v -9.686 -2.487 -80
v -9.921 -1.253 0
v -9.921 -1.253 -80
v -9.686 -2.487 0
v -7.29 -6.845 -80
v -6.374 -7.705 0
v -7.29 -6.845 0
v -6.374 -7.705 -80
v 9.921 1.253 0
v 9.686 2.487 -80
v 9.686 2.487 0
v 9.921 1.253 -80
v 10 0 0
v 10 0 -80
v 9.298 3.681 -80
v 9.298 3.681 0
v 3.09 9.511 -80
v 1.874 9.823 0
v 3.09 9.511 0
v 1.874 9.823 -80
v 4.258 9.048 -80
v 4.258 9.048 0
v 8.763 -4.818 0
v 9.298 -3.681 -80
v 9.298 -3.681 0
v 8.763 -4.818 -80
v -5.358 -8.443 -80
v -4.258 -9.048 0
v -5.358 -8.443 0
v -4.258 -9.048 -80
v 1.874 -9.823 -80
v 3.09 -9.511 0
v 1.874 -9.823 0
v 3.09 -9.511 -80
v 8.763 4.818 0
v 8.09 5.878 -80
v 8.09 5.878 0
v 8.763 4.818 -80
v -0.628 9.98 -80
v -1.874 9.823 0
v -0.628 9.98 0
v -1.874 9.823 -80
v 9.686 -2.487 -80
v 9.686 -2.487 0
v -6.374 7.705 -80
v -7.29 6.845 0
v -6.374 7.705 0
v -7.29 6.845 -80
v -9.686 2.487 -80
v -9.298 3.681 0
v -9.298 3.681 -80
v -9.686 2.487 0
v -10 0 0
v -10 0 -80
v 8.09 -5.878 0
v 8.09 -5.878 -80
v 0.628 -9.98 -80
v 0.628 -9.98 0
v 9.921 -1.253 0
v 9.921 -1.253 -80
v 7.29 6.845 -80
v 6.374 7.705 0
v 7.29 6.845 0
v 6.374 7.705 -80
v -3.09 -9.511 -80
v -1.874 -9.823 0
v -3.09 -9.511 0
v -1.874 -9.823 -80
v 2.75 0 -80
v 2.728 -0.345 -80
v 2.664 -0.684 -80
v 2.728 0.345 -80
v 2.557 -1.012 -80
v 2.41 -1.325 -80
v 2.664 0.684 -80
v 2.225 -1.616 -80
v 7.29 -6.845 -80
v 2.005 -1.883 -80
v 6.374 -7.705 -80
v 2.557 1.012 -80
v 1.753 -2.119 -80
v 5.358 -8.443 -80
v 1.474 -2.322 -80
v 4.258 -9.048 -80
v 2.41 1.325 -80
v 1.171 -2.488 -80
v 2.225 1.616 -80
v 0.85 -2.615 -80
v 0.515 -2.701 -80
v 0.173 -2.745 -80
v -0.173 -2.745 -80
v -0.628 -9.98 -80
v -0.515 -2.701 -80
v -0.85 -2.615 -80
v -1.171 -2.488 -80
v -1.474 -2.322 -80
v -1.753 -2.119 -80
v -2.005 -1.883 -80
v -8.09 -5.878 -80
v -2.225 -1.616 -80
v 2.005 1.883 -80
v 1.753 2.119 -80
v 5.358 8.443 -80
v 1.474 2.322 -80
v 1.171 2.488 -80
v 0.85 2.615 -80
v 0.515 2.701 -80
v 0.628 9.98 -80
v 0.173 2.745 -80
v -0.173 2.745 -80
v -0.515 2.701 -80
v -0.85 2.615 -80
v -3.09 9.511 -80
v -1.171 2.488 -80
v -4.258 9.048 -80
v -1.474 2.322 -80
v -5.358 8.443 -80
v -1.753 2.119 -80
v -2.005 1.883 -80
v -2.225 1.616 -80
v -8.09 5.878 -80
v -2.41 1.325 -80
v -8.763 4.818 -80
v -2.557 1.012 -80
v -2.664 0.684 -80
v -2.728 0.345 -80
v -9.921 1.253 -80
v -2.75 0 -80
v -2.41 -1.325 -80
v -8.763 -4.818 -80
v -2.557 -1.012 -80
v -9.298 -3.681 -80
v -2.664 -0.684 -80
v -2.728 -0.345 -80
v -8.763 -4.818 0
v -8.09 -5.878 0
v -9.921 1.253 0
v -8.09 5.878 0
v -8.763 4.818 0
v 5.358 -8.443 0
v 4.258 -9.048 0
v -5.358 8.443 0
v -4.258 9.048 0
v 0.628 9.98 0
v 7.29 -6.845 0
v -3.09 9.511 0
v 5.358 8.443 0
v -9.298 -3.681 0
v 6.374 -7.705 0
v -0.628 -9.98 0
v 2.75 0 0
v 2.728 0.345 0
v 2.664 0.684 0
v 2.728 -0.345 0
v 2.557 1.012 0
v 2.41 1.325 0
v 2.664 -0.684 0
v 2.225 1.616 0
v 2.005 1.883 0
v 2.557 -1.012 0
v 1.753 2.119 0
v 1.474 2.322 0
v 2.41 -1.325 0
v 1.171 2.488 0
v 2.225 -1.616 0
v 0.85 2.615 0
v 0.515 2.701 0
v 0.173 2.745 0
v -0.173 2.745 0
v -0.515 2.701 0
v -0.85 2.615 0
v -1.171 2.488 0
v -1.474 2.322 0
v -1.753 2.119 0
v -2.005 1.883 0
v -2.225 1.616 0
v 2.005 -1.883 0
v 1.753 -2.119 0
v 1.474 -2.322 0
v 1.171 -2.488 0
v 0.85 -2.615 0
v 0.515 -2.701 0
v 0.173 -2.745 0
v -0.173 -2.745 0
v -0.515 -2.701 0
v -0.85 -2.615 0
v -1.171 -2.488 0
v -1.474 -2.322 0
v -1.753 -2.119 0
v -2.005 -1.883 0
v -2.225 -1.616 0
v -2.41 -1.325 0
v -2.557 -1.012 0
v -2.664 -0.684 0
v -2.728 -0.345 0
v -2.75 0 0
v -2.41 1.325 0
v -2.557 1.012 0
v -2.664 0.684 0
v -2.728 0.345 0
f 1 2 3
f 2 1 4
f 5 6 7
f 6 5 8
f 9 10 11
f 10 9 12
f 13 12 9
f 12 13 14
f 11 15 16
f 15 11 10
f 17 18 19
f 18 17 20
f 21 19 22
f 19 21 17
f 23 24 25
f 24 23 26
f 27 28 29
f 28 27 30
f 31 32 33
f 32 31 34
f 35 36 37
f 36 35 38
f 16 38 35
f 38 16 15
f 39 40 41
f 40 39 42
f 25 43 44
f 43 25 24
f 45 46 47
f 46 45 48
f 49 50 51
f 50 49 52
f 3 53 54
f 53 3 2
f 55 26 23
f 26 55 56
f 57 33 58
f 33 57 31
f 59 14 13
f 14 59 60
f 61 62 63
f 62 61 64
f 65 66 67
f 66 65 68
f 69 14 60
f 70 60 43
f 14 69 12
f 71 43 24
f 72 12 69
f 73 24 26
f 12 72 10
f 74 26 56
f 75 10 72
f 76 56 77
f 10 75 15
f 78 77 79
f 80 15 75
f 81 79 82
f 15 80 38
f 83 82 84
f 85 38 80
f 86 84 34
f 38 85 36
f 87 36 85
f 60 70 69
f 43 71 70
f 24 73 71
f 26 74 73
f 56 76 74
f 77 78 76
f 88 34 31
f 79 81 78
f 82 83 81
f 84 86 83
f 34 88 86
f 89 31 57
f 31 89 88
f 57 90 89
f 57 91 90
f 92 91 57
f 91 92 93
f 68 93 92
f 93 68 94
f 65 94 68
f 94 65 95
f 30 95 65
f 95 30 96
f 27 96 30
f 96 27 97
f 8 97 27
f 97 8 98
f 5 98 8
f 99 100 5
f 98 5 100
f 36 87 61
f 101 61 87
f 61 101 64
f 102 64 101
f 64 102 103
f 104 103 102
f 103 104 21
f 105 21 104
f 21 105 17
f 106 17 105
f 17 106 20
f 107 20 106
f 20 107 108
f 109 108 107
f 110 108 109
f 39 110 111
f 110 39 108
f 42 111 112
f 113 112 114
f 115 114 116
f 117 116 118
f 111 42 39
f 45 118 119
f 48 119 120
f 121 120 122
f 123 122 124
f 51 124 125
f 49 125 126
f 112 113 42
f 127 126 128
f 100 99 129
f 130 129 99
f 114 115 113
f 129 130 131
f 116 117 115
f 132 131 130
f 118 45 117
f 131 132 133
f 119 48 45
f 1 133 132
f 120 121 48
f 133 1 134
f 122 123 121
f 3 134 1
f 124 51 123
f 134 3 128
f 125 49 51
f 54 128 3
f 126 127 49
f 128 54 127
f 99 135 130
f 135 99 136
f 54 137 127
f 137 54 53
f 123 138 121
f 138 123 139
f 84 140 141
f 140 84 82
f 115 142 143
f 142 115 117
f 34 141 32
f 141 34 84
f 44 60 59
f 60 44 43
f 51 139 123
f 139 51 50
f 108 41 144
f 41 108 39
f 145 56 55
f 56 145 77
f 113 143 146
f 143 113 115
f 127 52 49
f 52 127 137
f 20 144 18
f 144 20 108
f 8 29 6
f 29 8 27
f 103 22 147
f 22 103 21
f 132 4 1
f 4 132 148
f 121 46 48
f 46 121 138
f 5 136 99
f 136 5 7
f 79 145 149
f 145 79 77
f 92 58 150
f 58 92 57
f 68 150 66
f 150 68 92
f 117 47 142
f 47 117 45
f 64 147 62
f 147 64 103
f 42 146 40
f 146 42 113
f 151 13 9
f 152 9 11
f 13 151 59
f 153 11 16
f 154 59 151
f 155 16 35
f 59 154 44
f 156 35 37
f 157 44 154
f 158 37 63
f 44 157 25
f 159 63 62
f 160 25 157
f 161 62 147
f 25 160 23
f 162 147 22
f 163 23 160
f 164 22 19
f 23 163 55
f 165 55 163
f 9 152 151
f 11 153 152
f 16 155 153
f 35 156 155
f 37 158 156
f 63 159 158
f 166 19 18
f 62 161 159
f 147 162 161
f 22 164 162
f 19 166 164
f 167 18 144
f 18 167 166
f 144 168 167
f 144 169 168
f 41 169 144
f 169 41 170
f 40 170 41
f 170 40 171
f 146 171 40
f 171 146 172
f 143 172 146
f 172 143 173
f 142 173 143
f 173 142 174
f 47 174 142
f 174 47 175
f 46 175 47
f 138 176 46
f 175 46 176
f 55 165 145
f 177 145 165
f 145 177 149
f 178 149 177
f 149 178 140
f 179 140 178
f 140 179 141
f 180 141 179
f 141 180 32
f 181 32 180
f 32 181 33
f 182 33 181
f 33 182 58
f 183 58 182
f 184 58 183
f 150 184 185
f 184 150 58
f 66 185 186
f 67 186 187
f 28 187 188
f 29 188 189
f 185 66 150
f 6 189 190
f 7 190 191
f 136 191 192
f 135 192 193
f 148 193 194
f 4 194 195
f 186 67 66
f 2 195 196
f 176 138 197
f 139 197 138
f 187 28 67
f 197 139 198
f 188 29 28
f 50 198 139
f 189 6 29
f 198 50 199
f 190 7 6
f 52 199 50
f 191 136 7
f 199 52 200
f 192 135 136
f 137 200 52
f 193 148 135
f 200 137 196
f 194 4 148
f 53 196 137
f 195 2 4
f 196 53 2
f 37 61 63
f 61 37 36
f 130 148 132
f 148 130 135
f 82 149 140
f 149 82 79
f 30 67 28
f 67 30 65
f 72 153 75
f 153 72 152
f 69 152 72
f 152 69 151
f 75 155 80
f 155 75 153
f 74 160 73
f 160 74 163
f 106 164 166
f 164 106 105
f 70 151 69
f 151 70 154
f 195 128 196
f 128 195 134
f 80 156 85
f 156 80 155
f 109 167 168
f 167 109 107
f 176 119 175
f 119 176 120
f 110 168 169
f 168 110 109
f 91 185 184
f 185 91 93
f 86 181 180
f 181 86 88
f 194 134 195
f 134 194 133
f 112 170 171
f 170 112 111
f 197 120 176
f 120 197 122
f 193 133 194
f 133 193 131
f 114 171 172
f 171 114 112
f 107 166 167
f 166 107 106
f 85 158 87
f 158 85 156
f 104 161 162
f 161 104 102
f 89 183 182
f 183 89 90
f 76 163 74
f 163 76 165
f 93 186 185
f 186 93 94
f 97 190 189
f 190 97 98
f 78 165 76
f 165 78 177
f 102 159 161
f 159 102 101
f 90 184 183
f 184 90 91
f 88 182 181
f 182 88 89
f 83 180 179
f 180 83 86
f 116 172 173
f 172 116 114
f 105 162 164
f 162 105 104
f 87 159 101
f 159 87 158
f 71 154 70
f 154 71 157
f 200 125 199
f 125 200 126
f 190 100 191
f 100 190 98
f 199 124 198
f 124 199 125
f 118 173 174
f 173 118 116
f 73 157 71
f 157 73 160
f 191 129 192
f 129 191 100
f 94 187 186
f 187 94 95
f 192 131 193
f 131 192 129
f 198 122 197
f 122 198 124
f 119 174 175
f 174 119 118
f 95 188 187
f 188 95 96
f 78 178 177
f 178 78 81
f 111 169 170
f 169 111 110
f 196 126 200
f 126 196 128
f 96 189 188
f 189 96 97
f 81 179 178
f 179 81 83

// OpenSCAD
$fn = 50;


difference() {
	union() {
		translate(v = [0, 0, -80.0000000000]) {
			cylinder(h = 80, r = 10.0000000000);
		}
		cylinder(h = 0, r = 13.0000000000);
	}
	union() {
		#translate(v = [0, 0, -80]) {
			cylinder(h = 80, r = 2.7500000000);
		}
	}
}
